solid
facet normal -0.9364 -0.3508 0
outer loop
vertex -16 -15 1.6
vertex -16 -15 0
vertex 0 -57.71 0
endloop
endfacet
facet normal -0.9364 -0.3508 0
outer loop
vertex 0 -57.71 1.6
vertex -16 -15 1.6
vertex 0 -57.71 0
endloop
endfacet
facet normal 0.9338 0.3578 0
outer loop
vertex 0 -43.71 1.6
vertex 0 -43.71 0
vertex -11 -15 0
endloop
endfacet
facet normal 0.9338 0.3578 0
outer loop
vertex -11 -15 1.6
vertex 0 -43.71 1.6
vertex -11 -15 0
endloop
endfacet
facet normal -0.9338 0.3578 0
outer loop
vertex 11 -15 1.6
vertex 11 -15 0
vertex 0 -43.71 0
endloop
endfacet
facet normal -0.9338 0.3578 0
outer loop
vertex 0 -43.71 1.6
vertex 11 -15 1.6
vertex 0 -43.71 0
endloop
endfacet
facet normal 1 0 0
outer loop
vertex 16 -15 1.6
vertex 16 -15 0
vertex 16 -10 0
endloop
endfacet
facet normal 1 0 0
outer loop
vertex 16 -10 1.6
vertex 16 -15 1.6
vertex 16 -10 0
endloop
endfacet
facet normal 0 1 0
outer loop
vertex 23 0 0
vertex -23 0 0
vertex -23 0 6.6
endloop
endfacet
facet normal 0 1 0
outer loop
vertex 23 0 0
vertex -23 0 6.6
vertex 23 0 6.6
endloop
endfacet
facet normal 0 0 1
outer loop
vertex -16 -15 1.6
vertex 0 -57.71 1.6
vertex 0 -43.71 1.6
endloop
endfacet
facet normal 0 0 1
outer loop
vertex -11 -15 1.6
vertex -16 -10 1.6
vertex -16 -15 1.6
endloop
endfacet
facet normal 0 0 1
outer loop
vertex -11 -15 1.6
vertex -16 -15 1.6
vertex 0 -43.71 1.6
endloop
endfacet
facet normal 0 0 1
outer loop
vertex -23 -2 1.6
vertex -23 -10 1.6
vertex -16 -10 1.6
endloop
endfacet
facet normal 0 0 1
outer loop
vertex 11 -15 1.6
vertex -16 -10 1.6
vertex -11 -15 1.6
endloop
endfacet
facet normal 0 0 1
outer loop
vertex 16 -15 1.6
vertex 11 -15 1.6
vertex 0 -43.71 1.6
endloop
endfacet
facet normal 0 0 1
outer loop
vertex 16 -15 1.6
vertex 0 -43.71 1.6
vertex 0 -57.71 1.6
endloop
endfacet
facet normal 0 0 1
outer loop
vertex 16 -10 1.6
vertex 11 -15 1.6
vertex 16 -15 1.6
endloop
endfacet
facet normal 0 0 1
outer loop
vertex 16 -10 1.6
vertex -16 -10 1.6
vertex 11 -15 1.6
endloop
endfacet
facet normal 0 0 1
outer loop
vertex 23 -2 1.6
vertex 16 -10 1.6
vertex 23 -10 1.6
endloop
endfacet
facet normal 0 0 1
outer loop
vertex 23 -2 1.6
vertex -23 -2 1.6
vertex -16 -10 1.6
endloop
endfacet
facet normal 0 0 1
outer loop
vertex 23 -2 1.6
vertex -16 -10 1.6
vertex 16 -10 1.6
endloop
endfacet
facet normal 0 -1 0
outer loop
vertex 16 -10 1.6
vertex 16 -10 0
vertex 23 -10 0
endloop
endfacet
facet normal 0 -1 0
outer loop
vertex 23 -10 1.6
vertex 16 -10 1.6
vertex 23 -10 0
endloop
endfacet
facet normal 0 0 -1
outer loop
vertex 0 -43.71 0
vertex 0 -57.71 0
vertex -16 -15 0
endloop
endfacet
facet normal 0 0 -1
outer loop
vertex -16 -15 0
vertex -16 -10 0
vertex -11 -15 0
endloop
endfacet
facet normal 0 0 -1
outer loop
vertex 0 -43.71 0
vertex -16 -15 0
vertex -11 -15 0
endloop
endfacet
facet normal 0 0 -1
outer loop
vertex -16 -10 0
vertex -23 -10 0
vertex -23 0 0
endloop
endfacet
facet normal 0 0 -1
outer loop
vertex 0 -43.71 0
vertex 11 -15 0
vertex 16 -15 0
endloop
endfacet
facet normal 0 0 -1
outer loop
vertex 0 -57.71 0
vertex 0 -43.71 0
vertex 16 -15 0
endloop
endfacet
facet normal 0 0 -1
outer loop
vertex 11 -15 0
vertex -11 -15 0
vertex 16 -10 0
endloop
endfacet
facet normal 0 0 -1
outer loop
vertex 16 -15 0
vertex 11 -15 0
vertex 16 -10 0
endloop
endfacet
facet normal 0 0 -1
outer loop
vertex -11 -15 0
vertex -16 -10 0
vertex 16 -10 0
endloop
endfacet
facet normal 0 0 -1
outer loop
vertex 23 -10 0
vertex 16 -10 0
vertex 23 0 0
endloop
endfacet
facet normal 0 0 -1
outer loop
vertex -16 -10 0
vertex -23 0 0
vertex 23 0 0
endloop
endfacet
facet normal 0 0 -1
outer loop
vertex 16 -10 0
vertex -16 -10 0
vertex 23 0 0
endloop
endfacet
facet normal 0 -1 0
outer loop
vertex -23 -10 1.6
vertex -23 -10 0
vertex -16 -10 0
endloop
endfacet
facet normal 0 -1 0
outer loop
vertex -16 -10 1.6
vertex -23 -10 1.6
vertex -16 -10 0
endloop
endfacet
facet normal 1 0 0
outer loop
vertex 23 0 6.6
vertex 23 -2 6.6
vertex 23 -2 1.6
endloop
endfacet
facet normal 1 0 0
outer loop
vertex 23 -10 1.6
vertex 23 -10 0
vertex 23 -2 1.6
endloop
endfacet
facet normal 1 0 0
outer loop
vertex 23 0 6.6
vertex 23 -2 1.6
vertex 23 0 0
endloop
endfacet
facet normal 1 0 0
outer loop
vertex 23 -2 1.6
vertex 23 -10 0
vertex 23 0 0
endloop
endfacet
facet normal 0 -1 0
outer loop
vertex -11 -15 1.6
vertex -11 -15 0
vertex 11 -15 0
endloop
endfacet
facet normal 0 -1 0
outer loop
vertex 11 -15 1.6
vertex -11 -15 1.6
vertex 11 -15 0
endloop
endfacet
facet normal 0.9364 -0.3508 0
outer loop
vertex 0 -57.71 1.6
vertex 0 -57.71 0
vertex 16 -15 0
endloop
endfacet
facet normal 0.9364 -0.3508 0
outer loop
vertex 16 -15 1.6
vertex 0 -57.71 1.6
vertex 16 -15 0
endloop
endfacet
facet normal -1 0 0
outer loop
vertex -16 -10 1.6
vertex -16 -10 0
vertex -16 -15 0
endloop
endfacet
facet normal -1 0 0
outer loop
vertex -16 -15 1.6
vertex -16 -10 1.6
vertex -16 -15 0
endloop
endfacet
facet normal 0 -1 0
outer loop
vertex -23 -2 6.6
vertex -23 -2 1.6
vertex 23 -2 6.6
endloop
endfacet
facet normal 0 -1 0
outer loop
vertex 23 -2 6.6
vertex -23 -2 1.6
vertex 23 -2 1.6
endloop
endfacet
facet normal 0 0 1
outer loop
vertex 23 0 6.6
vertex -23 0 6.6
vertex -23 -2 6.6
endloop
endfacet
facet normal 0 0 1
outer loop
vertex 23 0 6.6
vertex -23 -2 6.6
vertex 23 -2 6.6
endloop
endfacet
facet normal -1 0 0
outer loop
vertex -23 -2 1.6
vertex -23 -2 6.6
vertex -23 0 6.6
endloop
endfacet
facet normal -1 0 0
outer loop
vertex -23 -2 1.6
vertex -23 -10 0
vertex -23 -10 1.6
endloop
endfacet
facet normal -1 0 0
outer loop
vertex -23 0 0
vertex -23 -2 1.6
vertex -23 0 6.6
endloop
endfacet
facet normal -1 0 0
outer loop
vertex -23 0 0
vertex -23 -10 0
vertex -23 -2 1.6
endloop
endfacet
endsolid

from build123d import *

# Parameters (mm, degrees)
F1_DEPTH = 1.6
F2_W     = 46
F2_H     = 2
F3_DEPTH = 5


with BuildPart() as f1:
    # F0 (on Top) → F1 (new body)
    with BuildSketch(Plane.XY):
        Polygon((23, 0), (0, 0), (-23, 0), (-23, -10), (-16, -10), (-16, -15), (0, -57.71), (16, -15), (16, -10), (23, -10), align=None)
        Polygon((0, -43.71), (-11, -15), (0, -15), (11, -15), align=None, mode=Mode.SUBTRACT)
    extrude(amount=F1_DEPTH)

    # F2 (on face) → F3 (join)
    with BuildSketch(Plane.XY.offset(1.6)):
        with Locations((0, -1)):
            Rectangle(F2_W, F2_H)
    extrude(amount=F3_DEPTH)


solid = f1.part
